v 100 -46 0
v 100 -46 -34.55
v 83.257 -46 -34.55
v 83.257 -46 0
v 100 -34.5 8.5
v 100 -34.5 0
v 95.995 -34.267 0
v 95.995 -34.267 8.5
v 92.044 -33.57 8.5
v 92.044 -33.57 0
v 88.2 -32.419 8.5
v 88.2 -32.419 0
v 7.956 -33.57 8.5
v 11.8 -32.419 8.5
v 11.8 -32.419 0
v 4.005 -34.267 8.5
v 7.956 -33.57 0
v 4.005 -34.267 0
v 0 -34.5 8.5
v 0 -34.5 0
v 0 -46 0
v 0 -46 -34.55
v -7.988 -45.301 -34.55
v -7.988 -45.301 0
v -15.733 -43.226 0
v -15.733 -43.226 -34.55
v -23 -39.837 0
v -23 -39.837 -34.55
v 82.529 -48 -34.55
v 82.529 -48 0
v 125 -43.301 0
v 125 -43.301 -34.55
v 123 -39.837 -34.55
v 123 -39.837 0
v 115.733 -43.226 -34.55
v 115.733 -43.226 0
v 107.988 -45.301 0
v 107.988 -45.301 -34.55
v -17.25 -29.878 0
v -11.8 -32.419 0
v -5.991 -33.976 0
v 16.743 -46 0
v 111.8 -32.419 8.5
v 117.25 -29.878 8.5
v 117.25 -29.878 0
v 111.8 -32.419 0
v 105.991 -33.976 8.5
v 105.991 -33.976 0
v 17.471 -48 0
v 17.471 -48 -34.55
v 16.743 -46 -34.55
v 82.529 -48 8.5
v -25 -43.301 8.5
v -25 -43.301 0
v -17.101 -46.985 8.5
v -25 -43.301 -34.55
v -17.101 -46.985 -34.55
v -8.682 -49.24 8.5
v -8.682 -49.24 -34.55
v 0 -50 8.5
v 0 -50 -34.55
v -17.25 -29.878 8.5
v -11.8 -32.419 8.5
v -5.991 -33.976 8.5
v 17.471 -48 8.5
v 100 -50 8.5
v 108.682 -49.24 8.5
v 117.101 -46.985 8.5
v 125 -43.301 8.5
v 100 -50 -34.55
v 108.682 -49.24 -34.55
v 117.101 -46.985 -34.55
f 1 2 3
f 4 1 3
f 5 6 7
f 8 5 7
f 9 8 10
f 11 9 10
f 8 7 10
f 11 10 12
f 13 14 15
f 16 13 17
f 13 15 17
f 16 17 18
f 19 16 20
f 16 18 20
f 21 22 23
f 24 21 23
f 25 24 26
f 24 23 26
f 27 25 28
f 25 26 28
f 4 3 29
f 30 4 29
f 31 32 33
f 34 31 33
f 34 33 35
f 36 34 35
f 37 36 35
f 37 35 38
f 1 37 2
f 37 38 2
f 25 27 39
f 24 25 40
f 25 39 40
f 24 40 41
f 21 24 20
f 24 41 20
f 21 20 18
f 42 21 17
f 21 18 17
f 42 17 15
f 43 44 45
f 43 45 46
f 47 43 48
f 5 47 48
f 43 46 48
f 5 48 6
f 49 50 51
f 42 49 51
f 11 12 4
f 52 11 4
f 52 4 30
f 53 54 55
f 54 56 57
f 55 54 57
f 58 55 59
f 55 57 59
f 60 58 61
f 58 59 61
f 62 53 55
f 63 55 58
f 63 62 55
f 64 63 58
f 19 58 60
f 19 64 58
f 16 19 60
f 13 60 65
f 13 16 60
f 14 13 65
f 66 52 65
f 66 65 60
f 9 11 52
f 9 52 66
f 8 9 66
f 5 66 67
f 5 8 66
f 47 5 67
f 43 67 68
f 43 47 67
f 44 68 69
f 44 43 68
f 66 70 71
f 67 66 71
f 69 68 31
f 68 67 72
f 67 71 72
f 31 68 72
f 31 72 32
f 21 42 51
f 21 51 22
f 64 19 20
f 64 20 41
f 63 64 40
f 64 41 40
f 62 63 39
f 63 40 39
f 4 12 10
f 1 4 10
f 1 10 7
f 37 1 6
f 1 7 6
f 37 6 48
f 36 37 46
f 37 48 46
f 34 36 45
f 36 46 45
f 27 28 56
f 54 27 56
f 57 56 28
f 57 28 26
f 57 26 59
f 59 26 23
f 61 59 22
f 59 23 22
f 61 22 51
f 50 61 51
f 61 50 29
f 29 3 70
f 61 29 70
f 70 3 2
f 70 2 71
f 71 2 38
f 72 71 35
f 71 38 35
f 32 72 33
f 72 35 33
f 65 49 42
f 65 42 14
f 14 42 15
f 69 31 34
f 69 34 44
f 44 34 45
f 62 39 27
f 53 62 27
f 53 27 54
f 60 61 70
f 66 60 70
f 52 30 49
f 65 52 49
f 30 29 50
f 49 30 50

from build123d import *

# Parameters (mm, degrees)
EXTRUDE_1_DEPTH = 8.5
EXTRUDE_START   = -34.55
EXTRUDE_5_DEPTH = 34.55


with BuildPart() as part:
    # 草图1 → 凸台-拉伸1 (new body)
    with BuildSketch(Plane.XY):
        with BuildLine():
            Line((0, -50), (25, -50))
            Line((25, -50), (75, -50))
            Line((75, -50), (100, -50))
            ThreePointArc((100, -50), (112.940952255, -48.296291314), (125, -43.301270189))
            Line((125, -43.301270189), (117.25, -29.877876431))
            ThreePointArc((117.25, -29.877876431), (108.929257056, -33.324441007), (100, -34.5))
            ThreePointArc((100, -34.5), (94.00913787, -33.975867479), (88.200305055, -32.419395417))
            Line((88.200305055, -32.419395417), (82.529428755, -48))
            Line((82.529428755, -48), (75, -48))
            Line((75, -48), (25, -48))
            Line((25, -48), (17.470571245, -48))
            Line((17.470571245, -48), (11.799694945, -32.419395417))
            ThreePointArc((11.799694945, -32.419395417), (5.99086213, -33.975867479), (0, -34.5))
            ThreePointArc((0, -34.5), (-8.929257056, -33.324441007), (-17.25, -29.877876431))
            Line((-17.25, -29.877876431), (-25, -43.301270189))
            ThreePointArc((-25, -43.301270189), (-12.940952255, -48.296291314), (0, -50))
        make_face()
    extrude(amount=EXTRUDE_1_DEPTH)

    # 草图3 → 凸台-拉伸5 (add)
    with BuildSketch(Plane.XY.offset(EXTRUDE_START)):
        with BuildLine():
            Line((-23, -39.837168574), (-25, -43.301270189))
            ThreePointArc((-25, -43.301270189), (-12.940952255, -48.296291314), (0, -50))
            Line((0, -50), (100, -50))
            ThreePointArc((100, -50), (112.940952255, -48.296291314), (125, -43.301270189))
            Line((125, -43.301270189), (123, -39.837168574))
            ThreePointArc((123, -39.837168574), (111.905676075, -44.432588009), (100, -46))
            Line((100, -46), (83.257369224, -46))
            Line((83.257369224, -46), (82.529428755, -48))
            Line((82.529428755, -48), (17.470571245, -48))
            Line((17.470571245, -48), (16.742630776, -46))
            Line((16.742630776, -46), (0, -46))
            ThreePointArc((0, -46), (-11.905676075, -44.432588009), (-23, -39.837168574))
        make_face()
    extrude(amount=EXTRUDE_5_DEPTH)


solid = part.part
